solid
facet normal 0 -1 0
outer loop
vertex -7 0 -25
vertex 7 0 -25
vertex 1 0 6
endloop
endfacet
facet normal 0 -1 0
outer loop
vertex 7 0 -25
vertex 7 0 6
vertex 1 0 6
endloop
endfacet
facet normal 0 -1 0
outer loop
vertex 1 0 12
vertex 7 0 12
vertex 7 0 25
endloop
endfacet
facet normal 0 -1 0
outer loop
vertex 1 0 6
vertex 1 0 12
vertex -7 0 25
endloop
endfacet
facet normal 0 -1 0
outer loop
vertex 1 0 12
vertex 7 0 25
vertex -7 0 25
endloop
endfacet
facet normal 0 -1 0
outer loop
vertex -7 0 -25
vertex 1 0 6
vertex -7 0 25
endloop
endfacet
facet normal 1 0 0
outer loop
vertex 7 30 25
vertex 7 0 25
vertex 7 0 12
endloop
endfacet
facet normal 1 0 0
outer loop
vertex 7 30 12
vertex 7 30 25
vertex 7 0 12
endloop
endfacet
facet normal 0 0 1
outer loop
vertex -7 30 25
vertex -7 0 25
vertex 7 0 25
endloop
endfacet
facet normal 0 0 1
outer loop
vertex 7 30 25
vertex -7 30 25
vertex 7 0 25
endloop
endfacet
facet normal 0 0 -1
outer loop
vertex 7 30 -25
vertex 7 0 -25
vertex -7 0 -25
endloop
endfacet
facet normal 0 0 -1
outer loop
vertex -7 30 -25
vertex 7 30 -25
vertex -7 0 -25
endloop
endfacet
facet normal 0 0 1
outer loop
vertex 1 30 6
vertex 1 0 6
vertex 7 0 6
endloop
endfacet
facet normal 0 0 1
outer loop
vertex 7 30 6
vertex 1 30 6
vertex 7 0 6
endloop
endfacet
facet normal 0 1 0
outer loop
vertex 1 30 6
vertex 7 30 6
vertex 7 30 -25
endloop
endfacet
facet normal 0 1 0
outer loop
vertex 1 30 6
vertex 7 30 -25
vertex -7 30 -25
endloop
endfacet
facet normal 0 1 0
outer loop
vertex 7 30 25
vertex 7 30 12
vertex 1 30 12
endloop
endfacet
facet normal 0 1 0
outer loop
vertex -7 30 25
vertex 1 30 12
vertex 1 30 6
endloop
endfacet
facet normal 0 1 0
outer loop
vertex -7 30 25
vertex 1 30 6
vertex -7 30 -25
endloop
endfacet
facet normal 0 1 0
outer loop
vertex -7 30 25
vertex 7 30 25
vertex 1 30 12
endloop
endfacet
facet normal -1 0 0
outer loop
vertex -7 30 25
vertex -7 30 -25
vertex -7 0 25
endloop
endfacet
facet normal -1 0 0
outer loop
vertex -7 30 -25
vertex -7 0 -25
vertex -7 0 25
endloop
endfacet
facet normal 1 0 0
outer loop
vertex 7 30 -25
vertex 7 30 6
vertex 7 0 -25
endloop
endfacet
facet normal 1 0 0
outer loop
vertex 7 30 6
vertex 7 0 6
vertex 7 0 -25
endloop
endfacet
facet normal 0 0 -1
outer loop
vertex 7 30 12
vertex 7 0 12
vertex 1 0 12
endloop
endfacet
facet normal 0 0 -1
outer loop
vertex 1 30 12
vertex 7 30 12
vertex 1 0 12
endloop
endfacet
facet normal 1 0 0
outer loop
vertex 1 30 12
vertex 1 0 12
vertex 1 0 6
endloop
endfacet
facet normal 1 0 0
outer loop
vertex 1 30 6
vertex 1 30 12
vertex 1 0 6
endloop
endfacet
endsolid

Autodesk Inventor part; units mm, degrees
ref_plane "YZ Plane" through (0, 0, 0) normal (1, 0, 0) x (0, 1, 0)
ref_plane "XZ Plane" through (0, 0, 0) normal (0, 1, 0) x (-1, 0, 0)
ref_plane "XY Plane" through (0, 0, 0) normal (0, 0, 1) x (1, 0, 0)
sketch "Sketch1" plane through (0, 0, 0) normal (0, 1, 0) x (-1, 0, 0)
  line L0 (9.8, 0) -> (-9.8, 0) projected
  line L1 (0, -35) -> (0, 35) projected
  line L2 (7, 25) -> (-7, 25)
  line L3 (-7, -25) -> (7, -25)
  line L4 (7, -25) -> (7, 25)
  line L5 (-7, 12) -> (-1, 12)
  line L6 (-1, 12) -> (-1, 6)
  line L7 (-1, 6) -> (-7, 6)
  line L8 (-7, 25) -> (-7, 12)
  line L9 (-7, 6) -> (-7, -25)
  point P0 (0, 0)
  point P1 (7, 0)
  point P2 (0, 25)
  dimension "d0" = 14
  dimension "d1" = 50
  dimension "d2" = 6
  dimension "d3" = 6
  dimension "d4" = 13
extrude "Extrusion1" add sketch "Sketch1" along normal blind 30
properties part number "FP Rear Hood"
